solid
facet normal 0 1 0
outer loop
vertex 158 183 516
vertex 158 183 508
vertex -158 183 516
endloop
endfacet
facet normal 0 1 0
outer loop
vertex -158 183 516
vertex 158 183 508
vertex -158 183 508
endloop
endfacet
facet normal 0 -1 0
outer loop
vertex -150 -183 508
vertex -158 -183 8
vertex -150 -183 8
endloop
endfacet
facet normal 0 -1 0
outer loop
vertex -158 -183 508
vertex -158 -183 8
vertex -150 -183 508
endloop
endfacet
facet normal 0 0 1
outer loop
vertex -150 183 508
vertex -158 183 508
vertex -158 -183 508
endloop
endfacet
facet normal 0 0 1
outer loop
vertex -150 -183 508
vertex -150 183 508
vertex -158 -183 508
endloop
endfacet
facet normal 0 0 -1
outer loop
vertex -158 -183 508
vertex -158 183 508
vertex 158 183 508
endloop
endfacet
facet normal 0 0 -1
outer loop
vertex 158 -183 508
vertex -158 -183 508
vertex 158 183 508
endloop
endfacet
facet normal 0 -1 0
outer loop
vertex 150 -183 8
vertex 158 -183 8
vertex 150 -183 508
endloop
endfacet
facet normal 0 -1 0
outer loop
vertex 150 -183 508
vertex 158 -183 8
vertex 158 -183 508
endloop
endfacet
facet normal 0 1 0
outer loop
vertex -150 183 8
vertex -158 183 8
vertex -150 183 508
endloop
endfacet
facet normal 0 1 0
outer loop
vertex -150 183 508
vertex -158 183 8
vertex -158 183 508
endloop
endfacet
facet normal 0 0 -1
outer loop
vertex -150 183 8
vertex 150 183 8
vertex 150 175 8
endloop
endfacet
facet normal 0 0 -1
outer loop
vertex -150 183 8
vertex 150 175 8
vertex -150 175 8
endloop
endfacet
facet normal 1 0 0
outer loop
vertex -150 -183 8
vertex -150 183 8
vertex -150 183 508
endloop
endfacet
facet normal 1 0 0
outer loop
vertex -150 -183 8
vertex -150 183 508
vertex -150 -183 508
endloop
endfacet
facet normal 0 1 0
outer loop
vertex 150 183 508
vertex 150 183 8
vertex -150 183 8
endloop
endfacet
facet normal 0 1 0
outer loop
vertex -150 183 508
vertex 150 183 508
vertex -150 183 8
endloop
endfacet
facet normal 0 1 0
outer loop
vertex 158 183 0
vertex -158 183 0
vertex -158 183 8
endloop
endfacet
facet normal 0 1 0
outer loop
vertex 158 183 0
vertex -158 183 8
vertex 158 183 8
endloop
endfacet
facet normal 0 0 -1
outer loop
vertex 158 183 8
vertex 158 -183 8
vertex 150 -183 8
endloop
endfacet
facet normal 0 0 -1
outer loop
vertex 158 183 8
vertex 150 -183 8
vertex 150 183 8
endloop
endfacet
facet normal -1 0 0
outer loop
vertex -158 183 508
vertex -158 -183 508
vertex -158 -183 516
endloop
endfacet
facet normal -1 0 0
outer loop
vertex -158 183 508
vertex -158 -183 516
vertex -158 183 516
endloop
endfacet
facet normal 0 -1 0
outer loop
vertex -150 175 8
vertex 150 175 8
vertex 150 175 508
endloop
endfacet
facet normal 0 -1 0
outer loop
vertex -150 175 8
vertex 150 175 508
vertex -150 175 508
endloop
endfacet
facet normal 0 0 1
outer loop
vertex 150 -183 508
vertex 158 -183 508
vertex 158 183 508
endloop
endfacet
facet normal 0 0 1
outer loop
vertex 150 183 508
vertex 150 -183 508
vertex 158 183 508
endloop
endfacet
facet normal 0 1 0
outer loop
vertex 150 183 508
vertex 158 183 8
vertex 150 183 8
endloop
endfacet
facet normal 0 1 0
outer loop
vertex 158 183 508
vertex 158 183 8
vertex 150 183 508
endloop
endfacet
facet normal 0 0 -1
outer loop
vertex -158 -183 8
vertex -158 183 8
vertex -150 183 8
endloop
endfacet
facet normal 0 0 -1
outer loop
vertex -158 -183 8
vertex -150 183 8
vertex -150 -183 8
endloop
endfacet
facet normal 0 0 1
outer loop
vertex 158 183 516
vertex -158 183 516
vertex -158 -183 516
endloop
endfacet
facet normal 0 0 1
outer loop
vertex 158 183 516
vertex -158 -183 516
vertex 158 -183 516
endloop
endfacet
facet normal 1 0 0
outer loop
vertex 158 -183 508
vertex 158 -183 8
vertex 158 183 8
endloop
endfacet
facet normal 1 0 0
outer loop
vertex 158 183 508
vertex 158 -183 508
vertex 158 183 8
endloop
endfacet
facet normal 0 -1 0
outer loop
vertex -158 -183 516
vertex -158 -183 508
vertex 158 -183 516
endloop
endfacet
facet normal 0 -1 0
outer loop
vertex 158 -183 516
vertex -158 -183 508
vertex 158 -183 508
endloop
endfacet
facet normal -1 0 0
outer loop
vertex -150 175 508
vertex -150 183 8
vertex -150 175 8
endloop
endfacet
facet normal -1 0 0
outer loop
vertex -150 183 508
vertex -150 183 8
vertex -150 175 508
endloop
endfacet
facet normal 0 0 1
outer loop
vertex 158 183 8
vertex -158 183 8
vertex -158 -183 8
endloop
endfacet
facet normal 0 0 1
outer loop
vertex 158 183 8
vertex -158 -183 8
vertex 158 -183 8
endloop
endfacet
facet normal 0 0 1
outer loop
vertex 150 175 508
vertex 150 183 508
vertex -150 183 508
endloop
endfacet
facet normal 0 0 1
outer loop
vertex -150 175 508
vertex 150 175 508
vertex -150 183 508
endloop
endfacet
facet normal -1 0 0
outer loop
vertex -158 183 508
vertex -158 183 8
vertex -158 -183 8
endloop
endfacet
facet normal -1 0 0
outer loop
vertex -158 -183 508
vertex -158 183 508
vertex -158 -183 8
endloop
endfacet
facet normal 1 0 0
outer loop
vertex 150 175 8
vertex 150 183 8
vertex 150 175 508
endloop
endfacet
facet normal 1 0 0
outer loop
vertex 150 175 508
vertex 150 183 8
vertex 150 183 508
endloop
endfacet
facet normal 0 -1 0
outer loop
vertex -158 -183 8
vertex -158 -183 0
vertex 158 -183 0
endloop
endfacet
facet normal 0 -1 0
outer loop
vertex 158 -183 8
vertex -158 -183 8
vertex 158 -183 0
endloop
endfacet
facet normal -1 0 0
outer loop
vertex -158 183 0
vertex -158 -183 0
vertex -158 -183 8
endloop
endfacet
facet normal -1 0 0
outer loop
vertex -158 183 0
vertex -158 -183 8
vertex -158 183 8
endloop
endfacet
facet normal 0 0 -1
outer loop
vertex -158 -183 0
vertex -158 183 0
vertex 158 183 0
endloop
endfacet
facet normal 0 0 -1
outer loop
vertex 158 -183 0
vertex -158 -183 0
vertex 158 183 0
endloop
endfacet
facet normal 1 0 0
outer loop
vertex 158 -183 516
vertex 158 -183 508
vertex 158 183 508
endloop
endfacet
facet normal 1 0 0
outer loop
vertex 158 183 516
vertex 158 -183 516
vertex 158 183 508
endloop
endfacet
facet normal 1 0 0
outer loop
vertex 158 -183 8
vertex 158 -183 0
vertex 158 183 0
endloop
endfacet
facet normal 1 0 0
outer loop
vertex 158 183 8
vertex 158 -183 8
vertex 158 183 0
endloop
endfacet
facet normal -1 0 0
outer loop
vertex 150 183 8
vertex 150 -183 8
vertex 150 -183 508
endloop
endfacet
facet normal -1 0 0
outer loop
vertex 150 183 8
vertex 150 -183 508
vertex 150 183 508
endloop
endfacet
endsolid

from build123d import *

# Parameters (mm, degrees)
F1_W      = 316
F1_H      = 366
F2_DEPTH  = 8
F3_W      = 366
F3_H      = 500
F4_DEPTH  = 8
F5_W      = 366
F5_H      = 500
F6_DEPTH  = 8
F7_W      = 300
F7_H      = 500
F8_DEPTH  = 8
F9_W      = 308
F9_H      = 366
F9_W_2    = 8
F10_DEPTH = 8


with BuildPart() as f2:
    # F1 (on Top) → F2 (new body)
    with BuildSketch(Plane.XY):
        Rectangle(F1_W, F1_H)
    extrude(amount=F2_DEPTH)


with BuildPart() as f4:
    # F3 (on face) → F4 (new body)
    with BuildSketch(Plane.YZ.offset(158)):
        with Locations((0, 258)):
            Rectangle(F3_W, F3_H)
    extrude(amount=-F4_DEPTH)


with BuildPart() as f6:
    # F5 (on face) → F6 (new body)
    with BuildSketch(Plane(origin=(-158, 0, 0), x_dir=(0, -1, 0), z_dir=(-1, 0, 0))):
        with Locations((0, 258)):
            Rectangle(F5_W, F5_H)
    extrude(amount=-F6_DEPTH)


with BuildPart() as f8:
    # F7 (on face) → F8 (new body)
    with BuildSketch(Plane(origin=(0, 183, 0), x_dir=(-1, 0, 0), z_dir=(0, 1, 0))):
        with Locations((0, 258)):
            Rectangle(F7_W, F7_H)
    extrude(amount=-F8_DEPTH)


with BuildPart() as f10:
    # F9 (on face) → F10 (new body)
    with BuildSketch(Plane.XY.offset(508)):
        with Locations((-4, 0)):
            Rectangle(F9_W, F9_H)
        with Locations((154, 0)):
            Rectangle(F9_W_2, F9_H)
    extrude(amount=F10_DEPTH)


solid = Compound([f2.part, f4.part, f6.part, f8.part, f10.part])
